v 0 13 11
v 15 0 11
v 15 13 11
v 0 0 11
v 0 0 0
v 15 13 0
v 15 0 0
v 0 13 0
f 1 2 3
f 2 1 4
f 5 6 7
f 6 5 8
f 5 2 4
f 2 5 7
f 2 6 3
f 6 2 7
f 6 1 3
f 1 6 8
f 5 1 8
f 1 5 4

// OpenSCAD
// Generated by SolidPython 1.0.1 on 2020-07-29 00:46:55


cube(size = [15, 13, 11]);
/***********************************************
*********      SolidPython code:      **********
************************************************
 
# import packages: SolidPython
from solid import *
from solid.utils import *
from itertools import chain, combinations, permutations


class Resize:

    def __init__(self, scad_file):
        self.scad_file = scad_file
        #self.scad_file = import_scad(scad_file)
        # cone/cylinder param:
        self.r1 = 0
        self.r2 = 0
        self.h = 0
        # rectangular prism param:
        self.w = 0
        self.l = 0
        # ellipse param:
        self.r = 0

    # import OpenScad code (file name corresponds to shape)


    # classify shape + parameters
    def assign(self, param1, param2, param3):
        if self.scad_file == 'cone.scad':
            self.r1 = param1
            self.r2 = param2
            self.h = param3
        elif self.scad_file == 'cylinder.scad':
            self.r1 = param1
            self.r2 = param2
            self.h = param3
        elif self.scad_file == 'rectangularPrism.scad':
            self.h = param1
            self.l = param2
            self.w = param3
        else:
            self.r = param1
            self.h = param2

    # resize parameters
    def iterate(self):
        x = range(3, 20, 2)
        i = 1
        if self.scad_file == 'cone.scad':
            tempList = list(permutations(x, 2))
            for temp in tempList:
                param1 = temp[0]
                param2 = temp[1]
                filepath = 'produced_scad_files/' + 'cone' + str(param1) + '_' + str(param2) + '_' + '.scad'
                scad_render_to_file(cylinder(h=param1, r1=param2, r2=0), filepath)

        elif self.scad_file == 'cylinder.scad':
            tempList = list(permutations(x, 3))
            for temp in tempList:
                param1 = temp[0]
                param2 = temp[1]
                filepath = 'produced_scad_files/' + 'cylinder' + str(param1) + '_' + str(param2) + '_' + '.scad'
                scad_render_to_file(cylinder(h=param1, r1=param2, r2=param2), filepath)

        elif self.scad_file == 'rectangularPrism.scad':
            tempList = list(permutations(x, 3))
            for temp in tempList:
                param1 = temp[0]
                param2 = temp[1]
                param3 = temp[2]
                filepath = 'produced_scad_files/' + 'rectangularPrism' + str(param1) + '_' + str(param2) + '_' + str(
                    param3) + '.scad'
                scad_render_to_file(cube(size=(param1, param2, param3)), filepath)

        elif self.scad_file == 'ellipse.scad':
            tempList = list(permutations(x, 4))
            for temp in tempList:
                param1 = temp[0]
                param2 = temp[1]
                param3 = temp[2]
                param4 = temp[3]
                filepath = 'produced_scad_files/' + 'ellipse' + str(param1) + '_' + str(param2) + '_' + str(param3) + '_' + str(param4) + '.scad'
                scad_render_to_file(scale([param1, param2, param3])(sphere(r=param4)), filepath)

    def render_to_scadfile(self):
        scad_render_to_file(scad, 'example.scad') 
 
************************************************/
